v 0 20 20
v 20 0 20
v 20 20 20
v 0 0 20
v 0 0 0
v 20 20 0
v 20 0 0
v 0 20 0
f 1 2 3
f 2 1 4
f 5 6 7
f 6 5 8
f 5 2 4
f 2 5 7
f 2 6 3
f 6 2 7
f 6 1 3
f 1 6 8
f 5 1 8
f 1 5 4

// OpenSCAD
// 動作確認用サンプル — 20mm 立方体
cube(20);
